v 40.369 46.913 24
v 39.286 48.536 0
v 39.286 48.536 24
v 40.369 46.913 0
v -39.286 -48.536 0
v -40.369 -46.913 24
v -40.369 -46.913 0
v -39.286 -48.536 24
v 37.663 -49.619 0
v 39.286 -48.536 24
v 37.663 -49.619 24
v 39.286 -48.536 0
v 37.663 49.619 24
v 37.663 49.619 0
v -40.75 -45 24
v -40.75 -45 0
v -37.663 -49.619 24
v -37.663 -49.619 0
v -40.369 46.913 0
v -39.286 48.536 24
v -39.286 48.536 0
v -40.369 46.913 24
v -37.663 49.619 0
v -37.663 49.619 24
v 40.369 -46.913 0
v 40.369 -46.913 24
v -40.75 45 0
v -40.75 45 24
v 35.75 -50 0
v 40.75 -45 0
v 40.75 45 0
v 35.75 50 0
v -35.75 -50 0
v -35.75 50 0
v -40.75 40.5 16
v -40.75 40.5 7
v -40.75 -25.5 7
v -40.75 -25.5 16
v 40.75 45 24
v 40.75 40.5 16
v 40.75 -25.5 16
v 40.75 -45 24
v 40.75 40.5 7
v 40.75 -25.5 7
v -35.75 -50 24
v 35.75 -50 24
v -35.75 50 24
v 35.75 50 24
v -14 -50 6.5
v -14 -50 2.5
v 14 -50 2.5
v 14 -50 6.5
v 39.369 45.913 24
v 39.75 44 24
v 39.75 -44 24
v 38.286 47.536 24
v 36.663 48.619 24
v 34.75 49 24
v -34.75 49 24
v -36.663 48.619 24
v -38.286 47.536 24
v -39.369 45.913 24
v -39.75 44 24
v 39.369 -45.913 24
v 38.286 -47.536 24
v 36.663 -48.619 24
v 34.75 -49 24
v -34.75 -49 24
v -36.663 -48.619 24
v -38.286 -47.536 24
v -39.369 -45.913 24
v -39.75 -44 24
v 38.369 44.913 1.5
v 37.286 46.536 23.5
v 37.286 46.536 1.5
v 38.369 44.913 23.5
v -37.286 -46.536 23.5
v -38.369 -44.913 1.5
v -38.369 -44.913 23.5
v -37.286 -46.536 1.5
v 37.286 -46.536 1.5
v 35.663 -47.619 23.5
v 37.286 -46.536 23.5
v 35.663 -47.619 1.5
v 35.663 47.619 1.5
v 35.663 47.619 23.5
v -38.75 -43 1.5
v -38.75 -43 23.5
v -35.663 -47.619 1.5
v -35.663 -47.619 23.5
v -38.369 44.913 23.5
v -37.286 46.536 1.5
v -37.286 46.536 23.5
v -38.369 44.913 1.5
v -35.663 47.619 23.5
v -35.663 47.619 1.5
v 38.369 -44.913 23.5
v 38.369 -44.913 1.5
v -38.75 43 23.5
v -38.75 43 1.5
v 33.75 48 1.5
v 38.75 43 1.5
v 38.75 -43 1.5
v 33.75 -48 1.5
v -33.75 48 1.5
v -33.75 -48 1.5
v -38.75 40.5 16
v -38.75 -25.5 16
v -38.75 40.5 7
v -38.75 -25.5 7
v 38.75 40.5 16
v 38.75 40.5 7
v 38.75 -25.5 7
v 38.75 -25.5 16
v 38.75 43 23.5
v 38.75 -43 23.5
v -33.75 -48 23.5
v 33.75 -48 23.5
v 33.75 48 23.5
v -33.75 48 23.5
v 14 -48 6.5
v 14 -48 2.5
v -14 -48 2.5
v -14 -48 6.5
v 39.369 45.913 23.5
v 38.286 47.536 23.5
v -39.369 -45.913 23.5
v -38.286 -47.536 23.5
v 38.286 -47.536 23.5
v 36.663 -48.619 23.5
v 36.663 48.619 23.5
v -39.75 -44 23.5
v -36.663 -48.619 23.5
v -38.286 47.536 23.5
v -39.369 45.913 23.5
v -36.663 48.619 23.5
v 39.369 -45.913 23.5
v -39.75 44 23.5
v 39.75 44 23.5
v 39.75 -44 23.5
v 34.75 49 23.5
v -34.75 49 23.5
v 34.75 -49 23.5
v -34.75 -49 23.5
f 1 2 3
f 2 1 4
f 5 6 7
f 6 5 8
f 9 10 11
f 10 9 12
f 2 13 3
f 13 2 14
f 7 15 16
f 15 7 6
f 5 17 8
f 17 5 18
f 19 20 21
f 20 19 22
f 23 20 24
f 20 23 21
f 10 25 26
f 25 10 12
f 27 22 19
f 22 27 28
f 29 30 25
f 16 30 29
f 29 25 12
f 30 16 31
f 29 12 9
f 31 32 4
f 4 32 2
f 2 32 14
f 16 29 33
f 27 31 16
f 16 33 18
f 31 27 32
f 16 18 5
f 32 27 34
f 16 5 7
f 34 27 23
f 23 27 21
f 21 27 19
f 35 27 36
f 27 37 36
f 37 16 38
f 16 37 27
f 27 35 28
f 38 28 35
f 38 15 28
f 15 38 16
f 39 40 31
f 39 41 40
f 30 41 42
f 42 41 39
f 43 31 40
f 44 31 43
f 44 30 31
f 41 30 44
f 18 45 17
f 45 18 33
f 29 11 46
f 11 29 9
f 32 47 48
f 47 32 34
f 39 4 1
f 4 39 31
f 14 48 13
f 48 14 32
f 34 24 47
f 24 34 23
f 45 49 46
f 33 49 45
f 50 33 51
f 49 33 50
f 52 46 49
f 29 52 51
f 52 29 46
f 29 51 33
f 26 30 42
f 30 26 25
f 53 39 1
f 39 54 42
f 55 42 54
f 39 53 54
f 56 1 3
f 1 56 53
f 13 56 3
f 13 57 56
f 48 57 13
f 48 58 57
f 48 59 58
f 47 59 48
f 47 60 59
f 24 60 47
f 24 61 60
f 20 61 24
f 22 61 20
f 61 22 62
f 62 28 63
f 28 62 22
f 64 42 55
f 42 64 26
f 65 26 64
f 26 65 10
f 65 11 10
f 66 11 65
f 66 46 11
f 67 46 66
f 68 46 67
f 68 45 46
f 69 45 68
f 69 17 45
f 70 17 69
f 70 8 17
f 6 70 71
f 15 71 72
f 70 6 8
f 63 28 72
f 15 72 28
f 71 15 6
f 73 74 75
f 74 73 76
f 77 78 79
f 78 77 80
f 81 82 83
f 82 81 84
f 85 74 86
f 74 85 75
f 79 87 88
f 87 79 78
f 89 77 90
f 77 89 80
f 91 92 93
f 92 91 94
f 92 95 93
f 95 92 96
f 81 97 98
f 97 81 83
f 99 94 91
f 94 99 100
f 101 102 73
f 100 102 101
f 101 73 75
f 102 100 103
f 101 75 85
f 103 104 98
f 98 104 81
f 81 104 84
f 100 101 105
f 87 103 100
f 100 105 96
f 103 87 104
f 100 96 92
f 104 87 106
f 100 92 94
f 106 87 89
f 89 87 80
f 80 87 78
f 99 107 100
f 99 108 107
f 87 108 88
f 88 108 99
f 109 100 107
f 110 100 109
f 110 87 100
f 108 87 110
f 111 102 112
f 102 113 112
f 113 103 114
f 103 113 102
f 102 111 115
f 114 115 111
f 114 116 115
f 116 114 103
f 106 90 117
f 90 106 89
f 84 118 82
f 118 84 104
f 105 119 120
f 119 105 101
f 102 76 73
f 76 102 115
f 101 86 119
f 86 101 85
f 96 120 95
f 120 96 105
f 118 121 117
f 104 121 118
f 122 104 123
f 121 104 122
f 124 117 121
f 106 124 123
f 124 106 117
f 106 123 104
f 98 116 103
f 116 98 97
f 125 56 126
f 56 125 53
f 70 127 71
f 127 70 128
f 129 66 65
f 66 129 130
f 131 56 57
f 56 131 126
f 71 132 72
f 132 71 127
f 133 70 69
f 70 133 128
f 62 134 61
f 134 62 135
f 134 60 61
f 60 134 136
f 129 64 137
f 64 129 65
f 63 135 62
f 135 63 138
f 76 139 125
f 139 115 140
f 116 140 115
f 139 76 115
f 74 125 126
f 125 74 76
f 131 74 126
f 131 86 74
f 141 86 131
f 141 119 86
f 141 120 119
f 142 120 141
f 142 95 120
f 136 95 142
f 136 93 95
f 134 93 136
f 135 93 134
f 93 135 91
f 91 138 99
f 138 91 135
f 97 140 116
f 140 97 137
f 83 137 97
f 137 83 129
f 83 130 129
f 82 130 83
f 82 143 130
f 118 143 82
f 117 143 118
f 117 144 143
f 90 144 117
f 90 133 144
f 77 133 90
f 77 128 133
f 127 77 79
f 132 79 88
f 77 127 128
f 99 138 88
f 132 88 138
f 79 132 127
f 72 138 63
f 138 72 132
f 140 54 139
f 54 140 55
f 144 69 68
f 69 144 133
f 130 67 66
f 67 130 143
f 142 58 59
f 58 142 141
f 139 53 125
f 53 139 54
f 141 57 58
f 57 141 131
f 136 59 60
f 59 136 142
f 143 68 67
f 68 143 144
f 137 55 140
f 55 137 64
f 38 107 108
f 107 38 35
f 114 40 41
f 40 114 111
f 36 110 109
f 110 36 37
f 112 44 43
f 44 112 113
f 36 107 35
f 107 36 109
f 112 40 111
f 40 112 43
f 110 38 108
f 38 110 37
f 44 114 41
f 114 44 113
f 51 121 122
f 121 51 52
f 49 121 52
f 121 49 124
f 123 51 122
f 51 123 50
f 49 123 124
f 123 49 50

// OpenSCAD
//include <C__fakepath_roundedrect.scad>

/*
 * "8 channel relay case.scad"
 * 
 * Written by mattdurr @ Thingiverse
 *
 * This script is licensed under the Public Domain license.
 *
 *
 */


// because this case has rounded corners it has a different internal width and length to the object in it.
// but all we care about is the object in it, the rest is automatic

//all dimentions in mm

/* [Case] */

//Width of the object in the box
object_Width_text_box = 72.5;
//Length of the object in the box
object_Length_text_box = 91;
//Height of the object in the box, the box will match this
object_Height_text_box = 22.5;
//Depth of the floor layer
floor_Depth_text_box = 1.5;
//Width of the boxes shell
shell_Width_text_box = 2;
//The radius of the boxes corners
corner_Radius_text_box = 5;

//Ridge depth down the side of the case
ridge_Height_text_box = 0.5;
//Ridge depth into the shell
ridge_Depth_text_box = 1;

//Length of the screw terminal window
screw_Terminal_Window_Length_text_box = 66;
//Width of the screw terminal window
screw_Terminal_Window_Height_text_box = 9;
//Screw terminal window offset from bottom case wall
screw_Terminal_Window_Wall_Offset_text_box = 5;
//Screw terminal window offset from floor
screw_Terminal_Window_Floor_Offset_text_box = 10;


// I added an IO window for my board because I soldered a female header under the male IO
//Height of the IO window
io_Window_Height_text_box = 4;
//Width of the IO window
io_Window_Width_text_box = 28;
//Floor Offset of the IO window
io_Window_Offset_From_Floor_text_box = 3;

/* [Hidden] */

caseWidth = object_Width_text_box + (2 * shell_Width_text_box);
caseLength = object_Length_text_box + (2 * shell_Width_text_box);
caseHeight = object_Height_text_box + floor_Depth_text_box;


//visualize the object
//color("red") translate([0,0,(object_Height_text_box/2)+floor_Depth_text_box]) cube(size = [object_Width_text_box, object_Length_text_box, object_Height_text_box], center = true);

/* THE FOLLOWING SECTION WAS TAKEN FROM http://www.thingiverse.com/thing:9347 */
/* I AM EMBEDDING THIS HERE SO THAT I CAN USE THE CUSTOMIZER ON THINGIVERSE */

// You could simply do it this way if you have the boxes.scad
// file in your library
//use <boxes.scad>
//roundedBox([20, 30, 40], 5, true); 

// Or, you could do it this way if you want to roll your own
//roundedRect([20, 30, 40], 5, $fn=12);

// size - [x,y,z]
// radius - radius of corners
module roundedRect(size, radius)
{
	x = size[0];
	y = size[1];
	z = size[2];

	linear_extrude(height=z)
	hull()
	{
		// place 4 circles in the corners, with the given radius
		translate([(-x/2)+(radius/2), (-y/2)+(radius/2), 0])
		circle(r=radius);
	
		translate([(x/2)-(radius/2), (-y/2)+(radius/2), 0])
		circle(r=radius);
	
		translate([(-x/2)+(radius/2), (y/2)-(radius/2), 0])
		circle(r=radius);
	
		translate([(x/2)-(radius/2), (y/2)-(radius/2), 0])
		circle(r=radius);
	}
}

/* END OF BORROWED SECTION */

difference()
{
  //outer shell
  roundedRect([caseWidth, caseLength, caseHeight], corner_Radius_text_box, true);
  
  //inner volume
  translate([0,0,floor_Depth_text_box]) roundedRect([object_Width_text_box, object_Length_text_box, object_Height_text_box], corner_Radius_text_box, true);
  
  //ridge
  translate([0,0,caseHeight-ridge_Height_text_box]) roundedRect([caseWidth-(2*ridge_Depth_text_box), caseLength-(2*ridge_Depth_text_box), ridge_Height_text_box], corner_Radius_text_box, true);
  
  //ac connectors
  translate([0, ((object_Length_text_box/2)-(screw_Terminal_Window_Length_text_box/2))-screw_Terminal_Window_Wall_Offset_text_box, screw_Terminal_Window_Floor_Offset_text_box + floor_Depth_text_box]) cube(size = [caseWidth+(2*corner_Radius_text_box), screw_Terminal_Window_Length_text_box, screw_Terminal_Window_Height_text_box], center = true);
  
  //io connectors
  translate([0, -(object_Length_text_box/2)-(corner_Radius_text_box/2)-(shell_Width_text_box/2), io_Window_Offset_From_Floor_text_box+floor_Depth_text_box]) cube(size = [io_Window_Width_text_box, shell_Width_text_box, io_Window_Height_text_box], center = true);

}
